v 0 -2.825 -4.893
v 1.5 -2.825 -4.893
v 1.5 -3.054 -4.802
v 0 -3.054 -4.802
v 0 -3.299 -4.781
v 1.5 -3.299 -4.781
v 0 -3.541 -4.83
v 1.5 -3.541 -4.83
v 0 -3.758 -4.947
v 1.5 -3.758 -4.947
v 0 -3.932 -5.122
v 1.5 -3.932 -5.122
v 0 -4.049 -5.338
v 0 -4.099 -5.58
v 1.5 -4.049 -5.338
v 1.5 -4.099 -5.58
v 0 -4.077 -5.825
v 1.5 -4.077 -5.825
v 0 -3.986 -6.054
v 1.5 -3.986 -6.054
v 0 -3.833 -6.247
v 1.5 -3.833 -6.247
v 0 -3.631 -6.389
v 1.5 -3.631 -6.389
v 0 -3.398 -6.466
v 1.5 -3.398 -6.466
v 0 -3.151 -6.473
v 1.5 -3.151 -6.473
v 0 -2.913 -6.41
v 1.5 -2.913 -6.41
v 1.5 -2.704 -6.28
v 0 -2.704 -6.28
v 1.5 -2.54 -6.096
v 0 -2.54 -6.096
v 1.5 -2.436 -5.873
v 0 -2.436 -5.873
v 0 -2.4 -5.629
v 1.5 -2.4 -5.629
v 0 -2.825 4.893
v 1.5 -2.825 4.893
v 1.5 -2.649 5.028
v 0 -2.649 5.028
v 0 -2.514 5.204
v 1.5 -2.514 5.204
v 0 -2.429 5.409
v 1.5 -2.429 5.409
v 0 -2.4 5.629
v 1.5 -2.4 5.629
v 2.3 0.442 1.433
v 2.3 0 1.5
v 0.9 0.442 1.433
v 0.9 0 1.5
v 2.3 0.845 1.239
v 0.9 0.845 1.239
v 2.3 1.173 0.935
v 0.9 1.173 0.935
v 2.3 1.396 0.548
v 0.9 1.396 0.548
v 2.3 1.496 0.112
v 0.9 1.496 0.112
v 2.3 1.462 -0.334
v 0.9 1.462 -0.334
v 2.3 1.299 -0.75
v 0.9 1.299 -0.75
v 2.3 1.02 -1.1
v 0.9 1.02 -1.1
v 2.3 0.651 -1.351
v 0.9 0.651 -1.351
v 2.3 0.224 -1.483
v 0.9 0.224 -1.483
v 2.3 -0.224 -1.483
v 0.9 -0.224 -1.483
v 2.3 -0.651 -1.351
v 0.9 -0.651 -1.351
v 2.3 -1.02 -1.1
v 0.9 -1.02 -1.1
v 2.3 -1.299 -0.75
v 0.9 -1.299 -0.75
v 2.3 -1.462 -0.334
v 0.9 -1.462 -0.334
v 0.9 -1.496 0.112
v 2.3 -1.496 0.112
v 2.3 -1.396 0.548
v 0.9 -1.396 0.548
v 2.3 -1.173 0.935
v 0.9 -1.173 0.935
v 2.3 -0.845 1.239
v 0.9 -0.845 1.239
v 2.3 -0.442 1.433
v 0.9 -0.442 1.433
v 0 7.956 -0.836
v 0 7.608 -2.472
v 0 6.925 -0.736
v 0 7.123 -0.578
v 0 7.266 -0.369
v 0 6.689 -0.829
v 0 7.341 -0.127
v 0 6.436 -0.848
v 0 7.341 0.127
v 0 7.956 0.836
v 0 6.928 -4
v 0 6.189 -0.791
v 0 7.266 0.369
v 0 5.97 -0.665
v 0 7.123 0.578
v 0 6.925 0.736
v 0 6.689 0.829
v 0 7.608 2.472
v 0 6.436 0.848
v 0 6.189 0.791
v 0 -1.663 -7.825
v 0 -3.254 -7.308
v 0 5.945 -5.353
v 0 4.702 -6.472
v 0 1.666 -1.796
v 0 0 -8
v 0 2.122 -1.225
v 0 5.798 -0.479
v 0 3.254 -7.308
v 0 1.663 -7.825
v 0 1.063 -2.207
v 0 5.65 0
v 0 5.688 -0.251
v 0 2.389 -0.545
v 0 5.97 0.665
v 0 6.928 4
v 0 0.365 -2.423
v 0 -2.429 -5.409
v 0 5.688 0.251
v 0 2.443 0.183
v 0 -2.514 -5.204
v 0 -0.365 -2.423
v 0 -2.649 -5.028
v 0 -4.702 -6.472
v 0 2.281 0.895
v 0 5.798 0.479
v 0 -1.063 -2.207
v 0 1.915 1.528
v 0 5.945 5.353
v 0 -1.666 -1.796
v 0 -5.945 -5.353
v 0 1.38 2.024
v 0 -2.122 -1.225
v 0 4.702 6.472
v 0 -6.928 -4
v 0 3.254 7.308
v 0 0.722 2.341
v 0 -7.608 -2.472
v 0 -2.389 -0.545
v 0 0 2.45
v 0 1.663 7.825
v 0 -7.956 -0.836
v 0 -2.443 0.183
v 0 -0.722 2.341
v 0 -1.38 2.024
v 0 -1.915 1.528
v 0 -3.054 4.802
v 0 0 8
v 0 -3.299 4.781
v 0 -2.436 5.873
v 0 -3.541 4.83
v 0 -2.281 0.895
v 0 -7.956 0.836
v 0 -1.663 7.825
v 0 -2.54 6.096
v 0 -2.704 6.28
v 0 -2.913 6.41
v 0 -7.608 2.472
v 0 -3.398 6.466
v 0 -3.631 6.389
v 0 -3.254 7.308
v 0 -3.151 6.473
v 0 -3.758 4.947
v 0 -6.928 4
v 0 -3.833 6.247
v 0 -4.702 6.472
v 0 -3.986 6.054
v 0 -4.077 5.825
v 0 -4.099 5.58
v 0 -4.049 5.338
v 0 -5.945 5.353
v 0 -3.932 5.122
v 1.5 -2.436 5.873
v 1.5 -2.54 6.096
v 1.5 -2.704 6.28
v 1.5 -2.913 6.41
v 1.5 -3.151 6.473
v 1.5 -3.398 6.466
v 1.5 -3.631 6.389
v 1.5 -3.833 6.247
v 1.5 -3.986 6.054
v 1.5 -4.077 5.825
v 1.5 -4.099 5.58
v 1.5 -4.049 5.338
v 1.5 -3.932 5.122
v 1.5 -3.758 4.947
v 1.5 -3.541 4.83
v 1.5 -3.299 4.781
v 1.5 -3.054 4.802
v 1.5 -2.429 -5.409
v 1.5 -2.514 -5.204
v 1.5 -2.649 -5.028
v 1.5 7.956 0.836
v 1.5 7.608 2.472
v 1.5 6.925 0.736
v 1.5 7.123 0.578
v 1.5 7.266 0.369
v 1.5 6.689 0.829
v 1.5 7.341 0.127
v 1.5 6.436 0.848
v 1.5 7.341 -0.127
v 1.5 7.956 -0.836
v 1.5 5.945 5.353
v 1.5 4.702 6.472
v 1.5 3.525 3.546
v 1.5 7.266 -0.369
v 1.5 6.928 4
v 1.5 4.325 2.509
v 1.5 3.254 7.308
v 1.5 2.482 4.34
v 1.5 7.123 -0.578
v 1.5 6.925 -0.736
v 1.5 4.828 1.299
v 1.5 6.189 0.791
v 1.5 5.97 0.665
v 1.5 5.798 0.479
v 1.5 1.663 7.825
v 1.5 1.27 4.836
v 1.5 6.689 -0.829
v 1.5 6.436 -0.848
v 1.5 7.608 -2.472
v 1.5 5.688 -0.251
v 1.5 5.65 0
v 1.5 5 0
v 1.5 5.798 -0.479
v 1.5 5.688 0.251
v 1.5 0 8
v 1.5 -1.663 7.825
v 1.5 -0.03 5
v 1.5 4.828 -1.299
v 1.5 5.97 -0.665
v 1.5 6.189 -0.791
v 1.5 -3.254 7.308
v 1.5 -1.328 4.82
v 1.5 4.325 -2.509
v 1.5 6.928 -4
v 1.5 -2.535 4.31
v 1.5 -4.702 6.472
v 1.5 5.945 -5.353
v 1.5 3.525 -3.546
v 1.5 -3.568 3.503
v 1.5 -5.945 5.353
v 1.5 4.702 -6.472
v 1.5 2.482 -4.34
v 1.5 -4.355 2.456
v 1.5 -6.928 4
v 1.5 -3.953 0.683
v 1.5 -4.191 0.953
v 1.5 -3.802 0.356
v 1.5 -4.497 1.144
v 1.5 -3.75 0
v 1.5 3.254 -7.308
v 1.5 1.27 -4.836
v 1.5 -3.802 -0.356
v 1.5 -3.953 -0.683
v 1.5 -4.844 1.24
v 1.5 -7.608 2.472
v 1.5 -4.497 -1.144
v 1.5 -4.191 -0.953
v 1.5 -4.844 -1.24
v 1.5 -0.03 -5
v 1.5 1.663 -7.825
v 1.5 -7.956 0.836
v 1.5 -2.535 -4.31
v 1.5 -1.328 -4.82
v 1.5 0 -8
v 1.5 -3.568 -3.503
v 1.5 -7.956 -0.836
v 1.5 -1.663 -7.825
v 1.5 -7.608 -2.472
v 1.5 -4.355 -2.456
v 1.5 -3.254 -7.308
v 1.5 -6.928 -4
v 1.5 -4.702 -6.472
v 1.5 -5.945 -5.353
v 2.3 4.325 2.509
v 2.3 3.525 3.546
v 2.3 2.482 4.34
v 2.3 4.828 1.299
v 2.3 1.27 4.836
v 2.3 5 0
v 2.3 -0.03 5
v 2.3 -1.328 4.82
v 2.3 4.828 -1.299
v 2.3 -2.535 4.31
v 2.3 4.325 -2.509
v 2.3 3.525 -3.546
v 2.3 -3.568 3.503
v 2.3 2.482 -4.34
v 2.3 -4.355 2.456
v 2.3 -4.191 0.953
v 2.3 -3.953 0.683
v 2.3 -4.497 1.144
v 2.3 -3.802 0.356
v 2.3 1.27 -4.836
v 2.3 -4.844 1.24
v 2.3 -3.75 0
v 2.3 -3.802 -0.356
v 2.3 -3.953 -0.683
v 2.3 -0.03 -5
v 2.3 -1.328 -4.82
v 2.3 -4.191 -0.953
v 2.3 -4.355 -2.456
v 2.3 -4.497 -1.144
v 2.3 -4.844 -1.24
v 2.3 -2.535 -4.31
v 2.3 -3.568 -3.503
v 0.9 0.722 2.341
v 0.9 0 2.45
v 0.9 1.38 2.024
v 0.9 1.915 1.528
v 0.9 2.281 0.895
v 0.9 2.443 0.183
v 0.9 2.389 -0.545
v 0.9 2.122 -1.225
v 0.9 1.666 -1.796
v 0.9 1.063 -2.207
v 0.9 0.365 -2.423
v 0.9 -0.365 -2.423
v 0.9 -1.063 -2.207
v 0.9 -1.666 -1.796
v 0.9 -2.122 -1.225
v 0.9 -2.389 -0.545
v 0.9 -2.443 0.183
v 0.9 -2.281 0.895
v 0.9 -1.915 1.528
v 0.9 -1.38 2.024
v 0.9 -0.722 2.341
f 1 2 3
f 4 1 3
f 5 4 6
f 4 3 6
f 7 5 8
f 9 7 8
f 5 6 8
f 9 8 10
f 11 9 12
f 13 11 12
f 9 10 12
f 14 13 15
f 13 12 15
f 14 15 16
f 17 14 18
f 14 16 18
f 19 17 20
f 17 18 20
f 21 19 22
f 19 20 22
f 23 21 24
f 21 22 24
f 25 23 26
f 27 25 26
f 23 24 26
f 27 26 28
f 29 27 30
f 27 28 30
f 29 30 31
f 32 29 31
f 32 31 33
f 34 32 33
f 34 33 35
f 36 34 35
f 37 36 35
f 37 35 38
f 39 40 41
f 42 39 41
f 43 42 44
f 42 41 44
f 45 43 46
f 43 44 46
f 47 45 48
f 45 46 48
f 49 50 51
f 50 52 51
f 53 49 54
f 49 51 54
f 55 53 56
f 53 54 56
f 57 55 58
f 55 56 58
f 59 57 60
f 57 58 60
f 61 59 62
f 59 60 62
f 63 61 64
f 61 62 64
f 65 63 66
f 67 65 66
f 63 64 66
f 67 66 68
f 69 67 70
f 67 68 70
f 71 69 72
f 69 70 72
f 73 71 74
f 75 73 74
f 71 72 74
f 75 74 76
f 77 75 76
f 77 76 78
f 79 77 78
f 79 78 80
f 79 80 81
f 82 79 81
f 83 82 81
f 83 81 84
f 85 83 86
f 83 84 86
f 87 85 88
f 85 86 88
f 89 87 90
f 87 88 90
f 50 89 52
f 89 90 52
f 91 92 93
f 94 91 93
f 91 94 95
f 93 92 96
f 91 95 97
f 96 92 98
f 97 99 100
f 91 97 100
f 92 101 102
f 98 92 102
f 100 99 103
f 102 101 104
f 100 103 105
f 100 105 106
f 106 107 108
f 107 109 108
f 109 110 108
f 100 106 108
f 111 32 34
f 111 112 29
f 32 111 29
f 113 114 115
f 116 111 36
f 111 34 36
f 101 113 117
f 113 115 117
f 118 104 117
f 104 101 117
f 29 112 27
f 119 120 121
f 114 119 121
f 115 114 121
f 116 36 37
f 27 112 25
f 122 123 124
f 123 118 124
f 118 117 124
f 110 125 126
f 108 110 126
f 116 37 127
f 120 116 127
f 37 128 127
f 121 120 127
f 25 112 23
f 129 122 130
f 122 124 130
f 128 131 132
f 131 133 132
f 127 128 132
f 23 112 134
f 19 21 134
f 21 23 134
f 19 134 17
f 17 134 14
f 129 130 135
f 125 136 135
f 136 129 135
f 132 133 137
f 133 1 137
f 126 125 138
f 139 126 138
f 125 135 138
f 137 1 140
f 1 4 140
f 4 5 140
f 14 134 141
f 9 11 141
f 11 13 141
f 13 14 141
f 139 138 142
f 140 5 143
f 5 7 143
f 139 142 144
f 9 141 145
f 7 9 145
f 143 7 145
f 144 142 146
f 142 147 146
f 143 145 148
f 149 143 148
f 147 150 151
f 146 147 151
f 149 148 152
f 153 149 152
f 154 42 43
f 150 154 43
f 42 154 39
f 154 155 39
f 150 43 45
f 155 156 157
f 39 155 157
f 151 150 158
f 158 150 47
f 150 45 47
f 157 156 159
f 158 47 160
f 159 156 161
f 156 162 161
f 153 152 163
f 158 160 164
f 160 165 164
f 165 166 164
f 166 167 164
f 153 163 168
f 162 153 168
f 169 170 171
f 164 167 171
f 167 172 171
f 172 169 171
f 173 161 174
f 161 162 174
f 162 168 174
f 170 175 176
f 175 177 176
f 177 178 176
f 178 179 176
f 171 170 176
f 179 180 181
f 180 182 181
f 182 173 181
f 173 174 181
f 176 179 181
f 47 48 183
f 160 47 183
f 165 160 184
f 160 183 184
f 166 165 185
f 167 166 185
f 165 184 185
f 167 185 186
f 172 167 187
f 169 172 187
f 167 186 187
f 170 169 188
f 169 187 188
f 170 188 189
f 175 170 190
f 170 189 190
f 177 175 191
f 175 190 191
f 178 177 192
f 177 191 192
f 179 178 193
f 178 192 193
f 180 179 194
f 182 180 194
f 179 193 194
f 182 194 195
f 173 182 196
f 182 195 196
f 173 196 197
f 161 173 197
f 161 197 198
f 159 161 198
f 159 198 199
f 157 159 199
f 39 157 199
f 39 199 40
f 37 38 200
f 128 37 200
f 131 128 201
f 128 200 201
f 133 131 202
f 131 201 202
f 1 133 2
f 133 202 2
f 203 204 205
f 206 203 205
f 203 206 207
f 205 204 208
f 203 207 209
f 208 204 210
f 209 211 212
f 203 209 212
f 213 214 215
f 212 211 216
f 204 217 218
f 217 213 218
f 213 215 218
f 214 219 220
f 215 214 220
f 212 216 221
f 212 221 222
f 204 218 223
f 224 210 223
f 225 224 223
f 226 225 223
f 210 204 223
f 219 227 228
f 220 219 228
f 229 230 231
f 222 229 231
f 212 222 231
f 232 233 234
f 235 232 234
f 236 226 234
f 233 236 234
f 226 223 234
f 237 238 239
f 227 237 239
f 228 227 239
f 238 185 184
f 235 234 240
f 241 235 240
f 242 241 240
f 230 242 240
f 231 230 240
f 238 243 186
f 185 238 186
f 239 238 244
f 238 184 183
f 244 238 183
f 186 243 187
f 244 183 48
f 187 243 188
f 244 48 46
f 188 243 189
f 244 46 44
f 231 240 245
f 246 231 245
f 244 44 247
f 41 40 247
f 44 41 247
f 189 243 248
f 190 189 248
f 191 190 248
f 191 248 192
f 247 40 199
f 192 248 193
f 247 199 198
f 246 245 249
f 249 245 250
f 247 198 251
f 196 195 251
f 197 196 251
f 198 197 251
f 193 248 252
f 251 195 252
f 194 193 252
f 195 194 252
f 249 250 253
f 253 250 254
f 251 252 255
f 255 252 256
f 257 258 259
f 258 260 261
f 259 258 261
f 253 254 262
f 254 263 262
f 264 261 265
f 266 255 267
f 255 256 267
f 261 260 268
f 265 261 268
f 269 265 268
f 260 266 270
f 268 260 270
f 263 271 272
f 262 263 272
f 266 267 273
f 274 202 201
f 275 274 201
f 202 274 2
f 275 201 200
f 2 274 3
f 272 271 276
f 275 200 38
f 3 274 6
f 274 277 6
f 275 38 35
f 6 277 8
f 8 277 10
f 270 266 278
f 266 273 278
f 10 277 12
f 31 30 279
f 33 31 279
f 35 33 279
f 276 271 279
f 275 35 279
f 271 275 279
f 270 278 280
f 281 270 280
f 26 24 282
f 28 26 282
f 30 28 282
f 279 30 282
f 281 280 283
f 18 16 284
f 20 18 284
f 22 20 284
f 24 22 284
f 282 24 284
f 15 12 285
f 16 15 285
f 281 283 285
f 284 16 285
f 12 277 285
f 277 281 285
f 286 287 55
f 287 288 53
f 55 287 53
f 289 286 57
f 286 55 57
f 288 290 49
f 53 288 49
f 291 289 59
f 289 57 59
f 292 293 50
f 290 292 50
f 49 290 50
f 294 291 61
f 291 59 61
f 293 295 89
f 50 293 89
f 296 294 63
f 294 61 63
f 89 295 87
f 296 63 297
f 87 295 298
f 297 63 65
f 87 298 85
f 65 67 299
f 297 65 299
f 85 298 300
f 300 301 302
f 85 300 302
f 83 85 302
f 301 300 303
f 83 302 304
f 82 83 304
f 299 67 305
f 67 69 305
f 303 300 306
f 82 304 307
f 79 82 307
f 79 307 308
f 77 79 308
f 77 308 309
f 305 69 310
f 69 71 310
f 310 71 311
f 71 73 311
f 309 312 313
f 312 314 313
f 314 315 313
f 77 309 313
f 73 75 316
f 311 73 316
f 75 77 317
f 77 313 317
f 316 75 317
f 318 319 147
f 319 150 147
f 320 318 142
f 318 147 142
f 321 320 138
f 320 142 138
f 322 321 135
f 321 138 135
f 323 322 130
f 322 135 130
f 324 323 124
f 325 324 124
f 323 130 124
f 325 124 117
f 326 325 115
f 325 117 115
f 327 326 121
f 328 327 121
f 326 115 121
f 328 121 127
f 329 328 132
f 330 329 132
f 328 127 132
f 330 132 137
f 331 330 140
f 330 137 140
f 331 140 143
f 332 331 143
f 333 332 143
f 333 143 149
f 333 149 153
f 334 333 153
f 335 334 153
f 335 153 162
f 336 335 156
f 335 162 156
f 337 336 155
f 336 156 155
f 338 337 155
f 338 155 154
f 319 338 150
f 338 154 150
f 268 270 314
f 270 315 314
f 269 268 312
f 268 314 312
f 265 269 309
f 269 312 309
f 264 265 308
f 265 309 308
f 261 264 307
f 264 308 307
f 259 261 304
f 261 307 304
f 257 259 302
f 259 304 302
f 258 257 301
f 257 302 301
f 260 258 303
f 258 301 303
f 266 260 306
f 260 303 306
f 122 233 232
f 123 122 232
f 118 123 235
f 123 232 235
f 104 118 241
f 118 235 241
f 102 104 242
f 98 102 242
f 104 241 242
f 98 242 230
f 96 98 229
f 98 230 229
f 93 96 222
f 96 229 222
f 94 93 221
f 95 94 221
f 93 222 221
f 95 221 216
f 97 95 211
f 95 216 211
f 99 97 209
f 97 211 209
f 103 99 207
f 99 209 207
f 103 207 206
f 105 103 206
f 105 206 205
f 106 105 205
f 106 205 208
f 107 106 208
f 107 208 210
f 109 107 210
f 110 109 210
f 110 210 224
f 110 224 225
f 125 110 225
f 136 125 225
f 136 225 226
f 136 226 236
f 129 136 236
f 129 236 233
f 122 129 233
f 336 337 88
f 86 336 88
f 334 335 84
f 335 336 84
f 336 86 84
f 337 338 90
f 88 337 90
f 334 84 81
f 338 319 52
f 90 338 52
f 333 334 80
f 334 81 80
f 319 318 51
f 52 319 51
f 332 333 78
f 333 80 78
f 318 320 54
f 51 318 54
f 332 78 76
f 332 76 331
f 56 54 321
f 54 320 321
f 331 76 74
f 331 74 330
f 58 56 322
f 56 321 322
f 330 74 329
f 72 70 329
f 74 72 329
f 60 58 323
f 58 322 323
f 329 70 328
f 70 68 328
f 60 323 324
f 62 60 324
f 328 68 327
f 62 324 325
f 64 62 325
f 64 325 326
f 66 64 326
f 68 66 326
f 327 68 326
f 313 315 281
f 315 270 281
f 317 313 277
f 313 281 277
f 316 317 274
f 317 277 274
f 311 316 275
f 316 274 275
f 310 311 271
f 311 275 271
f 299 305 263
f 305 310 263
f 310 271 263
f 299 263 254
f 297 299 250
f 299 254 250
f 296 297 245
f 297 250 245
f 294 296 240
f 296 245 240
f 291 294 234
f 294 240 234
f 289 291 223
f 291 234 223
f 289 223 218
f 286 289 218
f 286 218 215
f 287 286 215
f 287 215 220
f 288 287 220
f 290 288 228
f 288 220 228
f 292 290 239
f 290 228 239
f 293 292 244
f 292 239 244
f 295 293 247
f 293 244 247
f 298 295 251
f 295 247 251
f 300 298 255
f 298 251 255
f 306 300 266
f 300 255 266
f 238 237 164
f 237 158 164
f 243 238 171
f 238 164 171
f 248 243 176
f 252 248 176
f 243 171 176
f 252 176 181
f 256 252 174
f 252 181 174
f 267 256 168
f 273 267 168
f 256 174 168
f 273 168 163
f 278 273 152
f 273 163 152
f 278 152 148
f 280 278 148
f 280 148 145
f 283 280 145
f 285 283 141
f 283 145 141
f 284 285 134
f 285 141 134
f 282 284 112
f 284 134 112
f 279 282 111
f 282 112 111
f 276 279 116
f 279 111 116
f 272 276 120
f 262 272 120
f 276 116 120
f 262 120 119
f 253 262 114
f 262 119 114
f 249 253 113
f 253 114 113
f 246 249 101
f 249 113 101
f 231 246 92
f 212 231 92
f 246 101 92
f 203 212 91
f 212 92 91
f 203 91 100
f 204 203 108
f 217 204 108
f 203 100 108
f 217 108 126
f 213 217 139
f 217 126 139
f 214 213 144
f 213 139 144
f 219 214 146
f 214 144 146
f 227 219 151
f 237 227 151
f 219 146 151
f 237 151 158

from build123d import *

# Parameters (mm, degrees)
F5_DEPTH = 1.501
F6_R     = 1.25
F7_DEPTH = 0.8


with BuildPart() as f1:
    # F0 (on Front) → F1 (revolve)
    with BuildSketch(Plane.XZ):
        Polygon((0, 8), (0, 0), (2.3, 0), (2.3, 5), (1.5, 5), (1.5, 8), align=None)
    revolve(axis=Axis((1.15, 0, 0), (1, 0, 0)))

    # F2 (on Front) → F3 (revolve, cut)
    with BuildSketch(Plane.XZ):
        Polygon((0, 2.45), (0, 0), (2.3, 0), (2.3, 1.5), (0.9, 1.5), (0.9, 2.45), align=None)
    revolve(axis=Axis((1.15, 0, 0), (-1, 0, 0)), mode=Mode.SUBTRACT)

    # F4 (on face) → F5 (cut, through all)
    with BuildSketch(Plane.YZ.offset(1.5)):
        with BuildLine():
            ThreePointArc((7.35, 0), (6.5, 0.85), (5.65, 0))
            ThreePointArc((5.65, 0), (6.5, -0.85), (7.35, 0))
        make_face()
        with BuildLine():
            ThreePointArc((-2.4, -5.629165), (-2.513878, -5.204165), (-2.825, -4.893044))
            ThreePointArc((-2.825, -4.893044), (-3.986122, -6.054165), (-2.4, -5.629165))
        make_face()
        with BuildLine():
            ThreePointArc((-2.4, 5.629165), (-3.986122, 6.054165), (-2.825, 4.893044))
            ThreePointArc((-2.825, 4.893044), (-2.513878, 5.204165), (-2.4, 5.629165))
        make_face()
    extrude(amount=-F5_DEPTH, mode=Mode.SUBTRACT)

    # F6 (on face) → F7 (cut, through all)
    with BuildSketch(Plane.YZ.offset(2.3)):
        with Locations((-5, 0)):
            Circle(F6_R)
    extrude(amount=-F7_DEPTH, mode=Mode.SUBTRACT)


solid = f1.part
